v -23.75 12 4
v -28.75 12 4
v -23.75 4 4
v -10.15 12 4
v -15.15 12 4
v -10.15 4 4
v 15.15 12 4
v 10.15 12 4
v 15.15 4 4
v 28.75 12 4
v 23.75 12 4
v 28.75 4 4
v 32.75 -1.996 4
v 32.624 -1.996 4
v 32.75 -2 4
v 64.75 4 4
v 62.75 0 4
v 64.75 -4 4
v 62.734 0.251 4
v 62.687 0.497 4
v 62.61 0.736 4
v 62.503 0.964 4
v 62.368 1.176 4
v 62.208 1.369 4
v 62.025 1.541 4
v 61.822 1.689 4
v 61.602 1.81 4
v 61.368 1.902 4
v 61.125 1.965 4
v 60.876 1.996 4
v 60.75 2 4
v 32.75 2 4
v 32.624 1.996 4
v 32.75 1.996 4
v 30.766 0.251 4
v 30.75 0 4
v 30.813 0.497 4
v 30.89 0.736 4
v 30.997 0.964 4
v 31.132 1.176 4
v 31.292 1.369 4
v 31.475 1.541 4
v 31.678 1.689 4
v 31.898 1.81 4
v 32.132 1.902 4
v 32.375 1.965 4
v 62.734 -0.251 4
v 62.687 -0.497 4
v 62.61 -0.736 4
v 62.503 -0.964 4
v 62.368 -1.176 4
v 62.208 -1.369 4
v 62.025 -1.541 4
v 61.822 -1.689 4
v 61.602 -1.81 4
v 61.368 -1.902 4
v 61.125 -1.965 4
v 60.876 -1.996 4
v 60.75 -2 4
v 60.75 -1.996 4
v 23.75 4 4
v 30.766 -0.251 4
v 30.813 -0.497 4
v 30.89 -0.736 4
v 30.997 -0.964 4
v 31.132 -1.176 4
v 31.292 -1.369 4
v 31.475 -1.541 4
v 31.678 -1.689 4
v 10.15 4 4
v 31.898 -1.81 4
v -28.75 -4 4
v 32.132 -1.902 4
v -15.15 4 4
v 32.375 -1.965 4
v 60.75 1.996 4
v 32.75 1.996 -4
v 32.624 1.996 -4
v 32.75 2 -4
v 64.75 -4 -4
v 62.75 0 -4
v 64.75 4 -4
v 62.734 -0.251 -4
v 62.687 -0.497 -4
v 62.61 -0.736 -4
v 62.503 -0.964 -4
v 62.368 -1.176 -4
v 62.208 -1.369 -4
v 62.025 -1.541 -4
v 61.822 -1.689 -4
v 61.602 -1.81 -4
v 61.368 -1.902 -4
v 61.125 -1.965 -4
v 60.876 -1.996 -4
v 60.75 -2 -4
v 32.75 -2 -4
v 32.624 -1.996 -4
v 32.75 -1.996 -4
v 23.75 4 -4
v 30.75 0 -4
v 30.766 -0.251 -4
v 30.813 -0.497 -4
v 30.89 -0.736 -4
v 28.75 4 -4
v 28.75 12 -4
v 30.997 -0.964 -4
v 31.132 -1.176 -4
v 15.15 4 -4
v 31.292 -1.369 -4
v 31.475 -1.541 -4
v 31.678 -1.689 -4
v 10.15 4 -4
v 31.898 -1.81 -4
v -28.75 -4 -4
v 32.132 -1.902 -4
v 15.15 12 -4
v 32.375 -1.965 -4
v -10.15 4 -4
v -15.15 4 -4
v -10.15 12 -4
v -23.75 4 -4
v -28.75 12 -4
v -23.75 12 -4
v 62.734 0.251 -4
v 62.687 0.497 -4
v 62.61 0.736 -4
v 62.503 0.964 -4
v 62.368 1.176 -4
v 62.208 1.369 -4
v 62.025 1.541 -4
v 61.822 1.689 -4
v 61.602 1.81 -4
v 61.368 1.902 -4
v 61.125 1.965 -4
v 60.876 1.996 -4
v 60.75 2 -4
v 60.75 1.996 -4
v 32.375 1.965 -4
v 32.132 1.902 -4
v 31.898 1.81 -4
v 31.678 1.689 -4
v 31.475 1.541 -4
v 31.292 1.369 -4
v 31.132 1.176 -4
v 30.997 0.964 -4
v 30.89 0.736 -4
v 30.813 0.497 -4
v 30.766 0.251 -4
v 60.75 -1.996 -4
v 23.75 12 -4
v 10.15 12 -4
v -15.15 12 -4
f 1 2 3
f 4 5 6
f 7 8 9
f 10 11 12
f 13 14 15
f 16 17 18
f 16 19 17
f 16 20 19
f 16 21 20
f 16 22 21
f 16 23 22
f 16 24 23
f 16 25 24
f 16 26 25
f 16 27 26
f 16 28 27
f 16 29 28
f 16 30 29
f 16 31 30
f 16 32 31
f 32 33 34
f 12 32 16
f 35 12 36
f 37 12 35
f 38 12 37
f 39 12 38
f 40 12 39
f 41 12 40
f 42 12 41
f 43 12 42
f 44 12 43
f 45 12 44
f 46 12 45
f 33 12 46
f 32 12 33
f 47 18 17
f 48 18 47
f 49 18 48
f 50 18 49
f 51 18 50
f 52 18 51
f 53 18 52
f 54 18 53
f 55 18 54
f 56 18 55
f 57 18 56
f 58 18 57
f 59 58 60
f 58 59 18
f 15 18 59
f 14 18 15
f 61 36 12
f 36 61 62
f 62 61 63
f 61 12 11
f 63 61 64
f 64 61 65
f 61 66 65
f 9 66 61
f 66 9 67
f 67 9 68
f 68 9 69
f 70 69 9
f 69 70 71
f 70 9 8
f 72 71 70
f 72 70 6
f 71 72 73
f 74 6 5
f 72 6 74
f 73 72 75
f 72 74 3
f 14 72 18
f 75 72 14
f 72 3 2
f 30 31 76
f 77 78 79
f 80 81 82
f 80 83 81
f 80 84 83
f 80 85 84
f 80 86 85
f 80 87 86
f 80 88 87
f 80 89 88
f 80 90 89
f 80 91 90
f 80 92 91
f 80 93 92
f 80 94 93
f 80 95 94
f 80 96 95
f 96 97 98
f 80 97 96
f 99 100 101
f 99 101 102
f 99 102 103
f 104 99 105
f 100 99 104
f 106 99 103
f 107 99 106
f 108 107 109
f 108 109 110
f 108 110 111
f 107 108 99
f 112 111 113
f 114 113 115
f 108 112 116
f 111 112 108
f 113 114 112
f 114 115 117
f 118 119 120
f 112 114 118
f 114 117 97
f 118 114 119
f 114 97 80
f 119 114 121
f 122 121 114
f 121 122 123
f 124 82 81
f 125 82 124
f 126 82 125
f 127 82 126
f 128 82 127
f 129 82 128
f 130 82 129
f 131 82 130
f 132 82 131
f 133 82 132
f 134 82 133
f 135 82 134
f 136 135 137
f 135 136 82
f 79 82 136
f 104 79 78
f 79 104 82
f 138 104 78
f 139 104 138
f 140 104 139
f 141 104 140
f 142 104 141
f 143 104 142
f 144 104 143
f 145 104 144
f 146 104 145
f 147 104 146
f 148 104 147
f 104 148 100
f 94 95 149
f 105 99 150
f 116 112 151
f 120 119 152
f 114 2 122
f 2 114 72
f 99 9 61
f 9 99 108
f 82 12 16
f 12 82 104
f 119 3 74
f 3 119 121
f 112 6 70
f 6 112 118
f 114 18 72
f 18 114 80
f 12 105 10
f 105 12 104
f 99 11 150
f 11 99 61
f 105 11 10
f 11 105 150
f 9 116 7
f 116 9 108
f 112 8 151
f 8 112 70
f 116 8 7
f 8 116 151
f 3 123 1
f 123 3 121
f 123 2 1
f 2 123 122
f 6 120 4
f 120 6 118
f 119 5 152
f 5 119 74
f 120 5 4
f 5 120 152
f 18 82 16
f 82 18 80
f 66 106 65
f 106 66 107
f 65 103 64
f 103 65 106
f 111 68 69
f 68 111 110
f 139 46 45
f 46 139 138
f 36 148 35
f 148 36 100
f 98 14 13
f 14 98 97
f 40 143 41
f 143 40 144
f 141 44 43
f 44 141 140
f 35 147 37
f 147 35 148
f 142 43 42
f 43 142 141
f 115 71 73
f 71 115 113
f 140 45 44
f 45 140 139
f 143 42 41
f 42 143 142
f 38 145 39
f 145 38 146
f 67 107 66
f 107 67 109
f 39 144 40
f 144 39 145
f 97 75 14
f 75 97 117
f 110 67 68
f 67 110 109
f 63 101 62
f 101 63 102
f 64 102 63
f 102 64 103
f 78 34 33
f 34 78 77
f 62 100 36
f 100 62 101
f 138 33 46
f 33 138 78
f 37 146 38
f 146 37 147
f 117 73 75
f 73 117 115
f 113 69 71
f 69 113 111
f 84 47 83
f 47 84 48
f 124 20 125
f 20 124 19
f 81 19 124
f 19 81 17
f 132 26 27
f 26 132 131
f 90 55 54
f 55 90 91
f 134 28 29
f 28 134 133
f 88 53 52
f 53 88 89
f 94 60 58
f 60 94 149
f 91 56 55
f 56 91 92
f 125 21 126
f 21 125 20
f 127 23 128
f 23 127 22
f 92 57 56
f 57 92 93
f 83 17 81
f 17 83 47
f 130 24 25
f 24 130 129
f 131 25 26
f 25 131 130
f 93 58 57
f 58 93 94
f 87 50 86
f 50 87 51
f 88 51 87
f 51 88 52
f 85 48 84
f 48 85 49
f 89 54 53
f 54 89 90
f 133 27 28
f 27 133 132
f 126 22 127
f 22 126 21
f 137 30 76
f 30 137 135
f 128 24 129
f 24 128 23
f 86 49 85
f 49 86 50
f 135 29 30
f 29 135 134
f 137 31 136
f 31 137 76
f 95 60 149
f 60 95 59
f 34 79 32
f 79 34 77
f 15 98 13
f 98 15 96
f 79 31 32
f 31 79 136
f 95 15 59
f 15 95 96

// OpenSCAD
// triple gpu brace
// RTX 2080 TI Pair

// outside distance between gpus
outside_x = 47.5;       // outside of 2080s
extension_x = 36.0;     // extend to 1080
waterblock_x = 8.6;     // thickness of waterblock
jaw_x = 5.0;            // x dimension (thickness) of jaw
// not critical
backbone_x = outside_x + jaw_x + jaw_x;

backbone_y = 8;
jaw_y = 8;

thickness_z = 8;

$fn = 50;

difference () {
    union () {
        // backbone
        cube([backbone_x, backbone_y, thickness_z], center = true);

        // bottom 2080  lower-jaw
        translate([(backbone_x/2 - jaw_x/2),
            (backbone_y/2 + jaw_y/2),
            0])
        cube([jaw_x, jaw_y, thickness_z], center = true);
        // bottom 2080 upper-jaw
        translate([((backbone_x/2 - jaw_x) - (waterblock_x + jaw_x/2)),
            (backbone_y/2 + jaw_y/2),
            0])
        cube([jaw_x, jaw_y, thickness_z], center = true);
        
        // top 2080 jaws
       
        translate([-(backbone_x/2 - jaw_x/2),
            (backbone_y/2 + jaw_y/2),
            0])
        cube([jaw_x, jaw_y, thickness_z], center = true);
        
        translate([-((backbone_x/2 - jaw_x) - (waterblock_x + jaw_x/2)),
            (backbone_y/2 + jaw_y/2),
            0])
        cube([jaw_x, jaw_y, thickness_z], center = true); 
        
        // add the extension to connect 1080
        translate([backbone_x/2 + extension_x/2, 0, 0])
        cube([extension_x, backbone_y, thickness_z], center = true);
    }
    // subtract
    {
        translate([backbone_x/2 + 4, 0, 0])
        cylinder(r = 2, h = thickness_z, center = true);
        
        translate([backbone_x/2 + extension_x - 4, 0, 0])
        cylinder(r = 2, h = thickness_z, center = true);
        
        slot_x = (extension_x - 4 * 2);
        translate([backbone_x/2 + 4 + slot_x/2, 0, 0])
        #cube([ slot_x, 4, thickness_z], center = true);
    }
}
